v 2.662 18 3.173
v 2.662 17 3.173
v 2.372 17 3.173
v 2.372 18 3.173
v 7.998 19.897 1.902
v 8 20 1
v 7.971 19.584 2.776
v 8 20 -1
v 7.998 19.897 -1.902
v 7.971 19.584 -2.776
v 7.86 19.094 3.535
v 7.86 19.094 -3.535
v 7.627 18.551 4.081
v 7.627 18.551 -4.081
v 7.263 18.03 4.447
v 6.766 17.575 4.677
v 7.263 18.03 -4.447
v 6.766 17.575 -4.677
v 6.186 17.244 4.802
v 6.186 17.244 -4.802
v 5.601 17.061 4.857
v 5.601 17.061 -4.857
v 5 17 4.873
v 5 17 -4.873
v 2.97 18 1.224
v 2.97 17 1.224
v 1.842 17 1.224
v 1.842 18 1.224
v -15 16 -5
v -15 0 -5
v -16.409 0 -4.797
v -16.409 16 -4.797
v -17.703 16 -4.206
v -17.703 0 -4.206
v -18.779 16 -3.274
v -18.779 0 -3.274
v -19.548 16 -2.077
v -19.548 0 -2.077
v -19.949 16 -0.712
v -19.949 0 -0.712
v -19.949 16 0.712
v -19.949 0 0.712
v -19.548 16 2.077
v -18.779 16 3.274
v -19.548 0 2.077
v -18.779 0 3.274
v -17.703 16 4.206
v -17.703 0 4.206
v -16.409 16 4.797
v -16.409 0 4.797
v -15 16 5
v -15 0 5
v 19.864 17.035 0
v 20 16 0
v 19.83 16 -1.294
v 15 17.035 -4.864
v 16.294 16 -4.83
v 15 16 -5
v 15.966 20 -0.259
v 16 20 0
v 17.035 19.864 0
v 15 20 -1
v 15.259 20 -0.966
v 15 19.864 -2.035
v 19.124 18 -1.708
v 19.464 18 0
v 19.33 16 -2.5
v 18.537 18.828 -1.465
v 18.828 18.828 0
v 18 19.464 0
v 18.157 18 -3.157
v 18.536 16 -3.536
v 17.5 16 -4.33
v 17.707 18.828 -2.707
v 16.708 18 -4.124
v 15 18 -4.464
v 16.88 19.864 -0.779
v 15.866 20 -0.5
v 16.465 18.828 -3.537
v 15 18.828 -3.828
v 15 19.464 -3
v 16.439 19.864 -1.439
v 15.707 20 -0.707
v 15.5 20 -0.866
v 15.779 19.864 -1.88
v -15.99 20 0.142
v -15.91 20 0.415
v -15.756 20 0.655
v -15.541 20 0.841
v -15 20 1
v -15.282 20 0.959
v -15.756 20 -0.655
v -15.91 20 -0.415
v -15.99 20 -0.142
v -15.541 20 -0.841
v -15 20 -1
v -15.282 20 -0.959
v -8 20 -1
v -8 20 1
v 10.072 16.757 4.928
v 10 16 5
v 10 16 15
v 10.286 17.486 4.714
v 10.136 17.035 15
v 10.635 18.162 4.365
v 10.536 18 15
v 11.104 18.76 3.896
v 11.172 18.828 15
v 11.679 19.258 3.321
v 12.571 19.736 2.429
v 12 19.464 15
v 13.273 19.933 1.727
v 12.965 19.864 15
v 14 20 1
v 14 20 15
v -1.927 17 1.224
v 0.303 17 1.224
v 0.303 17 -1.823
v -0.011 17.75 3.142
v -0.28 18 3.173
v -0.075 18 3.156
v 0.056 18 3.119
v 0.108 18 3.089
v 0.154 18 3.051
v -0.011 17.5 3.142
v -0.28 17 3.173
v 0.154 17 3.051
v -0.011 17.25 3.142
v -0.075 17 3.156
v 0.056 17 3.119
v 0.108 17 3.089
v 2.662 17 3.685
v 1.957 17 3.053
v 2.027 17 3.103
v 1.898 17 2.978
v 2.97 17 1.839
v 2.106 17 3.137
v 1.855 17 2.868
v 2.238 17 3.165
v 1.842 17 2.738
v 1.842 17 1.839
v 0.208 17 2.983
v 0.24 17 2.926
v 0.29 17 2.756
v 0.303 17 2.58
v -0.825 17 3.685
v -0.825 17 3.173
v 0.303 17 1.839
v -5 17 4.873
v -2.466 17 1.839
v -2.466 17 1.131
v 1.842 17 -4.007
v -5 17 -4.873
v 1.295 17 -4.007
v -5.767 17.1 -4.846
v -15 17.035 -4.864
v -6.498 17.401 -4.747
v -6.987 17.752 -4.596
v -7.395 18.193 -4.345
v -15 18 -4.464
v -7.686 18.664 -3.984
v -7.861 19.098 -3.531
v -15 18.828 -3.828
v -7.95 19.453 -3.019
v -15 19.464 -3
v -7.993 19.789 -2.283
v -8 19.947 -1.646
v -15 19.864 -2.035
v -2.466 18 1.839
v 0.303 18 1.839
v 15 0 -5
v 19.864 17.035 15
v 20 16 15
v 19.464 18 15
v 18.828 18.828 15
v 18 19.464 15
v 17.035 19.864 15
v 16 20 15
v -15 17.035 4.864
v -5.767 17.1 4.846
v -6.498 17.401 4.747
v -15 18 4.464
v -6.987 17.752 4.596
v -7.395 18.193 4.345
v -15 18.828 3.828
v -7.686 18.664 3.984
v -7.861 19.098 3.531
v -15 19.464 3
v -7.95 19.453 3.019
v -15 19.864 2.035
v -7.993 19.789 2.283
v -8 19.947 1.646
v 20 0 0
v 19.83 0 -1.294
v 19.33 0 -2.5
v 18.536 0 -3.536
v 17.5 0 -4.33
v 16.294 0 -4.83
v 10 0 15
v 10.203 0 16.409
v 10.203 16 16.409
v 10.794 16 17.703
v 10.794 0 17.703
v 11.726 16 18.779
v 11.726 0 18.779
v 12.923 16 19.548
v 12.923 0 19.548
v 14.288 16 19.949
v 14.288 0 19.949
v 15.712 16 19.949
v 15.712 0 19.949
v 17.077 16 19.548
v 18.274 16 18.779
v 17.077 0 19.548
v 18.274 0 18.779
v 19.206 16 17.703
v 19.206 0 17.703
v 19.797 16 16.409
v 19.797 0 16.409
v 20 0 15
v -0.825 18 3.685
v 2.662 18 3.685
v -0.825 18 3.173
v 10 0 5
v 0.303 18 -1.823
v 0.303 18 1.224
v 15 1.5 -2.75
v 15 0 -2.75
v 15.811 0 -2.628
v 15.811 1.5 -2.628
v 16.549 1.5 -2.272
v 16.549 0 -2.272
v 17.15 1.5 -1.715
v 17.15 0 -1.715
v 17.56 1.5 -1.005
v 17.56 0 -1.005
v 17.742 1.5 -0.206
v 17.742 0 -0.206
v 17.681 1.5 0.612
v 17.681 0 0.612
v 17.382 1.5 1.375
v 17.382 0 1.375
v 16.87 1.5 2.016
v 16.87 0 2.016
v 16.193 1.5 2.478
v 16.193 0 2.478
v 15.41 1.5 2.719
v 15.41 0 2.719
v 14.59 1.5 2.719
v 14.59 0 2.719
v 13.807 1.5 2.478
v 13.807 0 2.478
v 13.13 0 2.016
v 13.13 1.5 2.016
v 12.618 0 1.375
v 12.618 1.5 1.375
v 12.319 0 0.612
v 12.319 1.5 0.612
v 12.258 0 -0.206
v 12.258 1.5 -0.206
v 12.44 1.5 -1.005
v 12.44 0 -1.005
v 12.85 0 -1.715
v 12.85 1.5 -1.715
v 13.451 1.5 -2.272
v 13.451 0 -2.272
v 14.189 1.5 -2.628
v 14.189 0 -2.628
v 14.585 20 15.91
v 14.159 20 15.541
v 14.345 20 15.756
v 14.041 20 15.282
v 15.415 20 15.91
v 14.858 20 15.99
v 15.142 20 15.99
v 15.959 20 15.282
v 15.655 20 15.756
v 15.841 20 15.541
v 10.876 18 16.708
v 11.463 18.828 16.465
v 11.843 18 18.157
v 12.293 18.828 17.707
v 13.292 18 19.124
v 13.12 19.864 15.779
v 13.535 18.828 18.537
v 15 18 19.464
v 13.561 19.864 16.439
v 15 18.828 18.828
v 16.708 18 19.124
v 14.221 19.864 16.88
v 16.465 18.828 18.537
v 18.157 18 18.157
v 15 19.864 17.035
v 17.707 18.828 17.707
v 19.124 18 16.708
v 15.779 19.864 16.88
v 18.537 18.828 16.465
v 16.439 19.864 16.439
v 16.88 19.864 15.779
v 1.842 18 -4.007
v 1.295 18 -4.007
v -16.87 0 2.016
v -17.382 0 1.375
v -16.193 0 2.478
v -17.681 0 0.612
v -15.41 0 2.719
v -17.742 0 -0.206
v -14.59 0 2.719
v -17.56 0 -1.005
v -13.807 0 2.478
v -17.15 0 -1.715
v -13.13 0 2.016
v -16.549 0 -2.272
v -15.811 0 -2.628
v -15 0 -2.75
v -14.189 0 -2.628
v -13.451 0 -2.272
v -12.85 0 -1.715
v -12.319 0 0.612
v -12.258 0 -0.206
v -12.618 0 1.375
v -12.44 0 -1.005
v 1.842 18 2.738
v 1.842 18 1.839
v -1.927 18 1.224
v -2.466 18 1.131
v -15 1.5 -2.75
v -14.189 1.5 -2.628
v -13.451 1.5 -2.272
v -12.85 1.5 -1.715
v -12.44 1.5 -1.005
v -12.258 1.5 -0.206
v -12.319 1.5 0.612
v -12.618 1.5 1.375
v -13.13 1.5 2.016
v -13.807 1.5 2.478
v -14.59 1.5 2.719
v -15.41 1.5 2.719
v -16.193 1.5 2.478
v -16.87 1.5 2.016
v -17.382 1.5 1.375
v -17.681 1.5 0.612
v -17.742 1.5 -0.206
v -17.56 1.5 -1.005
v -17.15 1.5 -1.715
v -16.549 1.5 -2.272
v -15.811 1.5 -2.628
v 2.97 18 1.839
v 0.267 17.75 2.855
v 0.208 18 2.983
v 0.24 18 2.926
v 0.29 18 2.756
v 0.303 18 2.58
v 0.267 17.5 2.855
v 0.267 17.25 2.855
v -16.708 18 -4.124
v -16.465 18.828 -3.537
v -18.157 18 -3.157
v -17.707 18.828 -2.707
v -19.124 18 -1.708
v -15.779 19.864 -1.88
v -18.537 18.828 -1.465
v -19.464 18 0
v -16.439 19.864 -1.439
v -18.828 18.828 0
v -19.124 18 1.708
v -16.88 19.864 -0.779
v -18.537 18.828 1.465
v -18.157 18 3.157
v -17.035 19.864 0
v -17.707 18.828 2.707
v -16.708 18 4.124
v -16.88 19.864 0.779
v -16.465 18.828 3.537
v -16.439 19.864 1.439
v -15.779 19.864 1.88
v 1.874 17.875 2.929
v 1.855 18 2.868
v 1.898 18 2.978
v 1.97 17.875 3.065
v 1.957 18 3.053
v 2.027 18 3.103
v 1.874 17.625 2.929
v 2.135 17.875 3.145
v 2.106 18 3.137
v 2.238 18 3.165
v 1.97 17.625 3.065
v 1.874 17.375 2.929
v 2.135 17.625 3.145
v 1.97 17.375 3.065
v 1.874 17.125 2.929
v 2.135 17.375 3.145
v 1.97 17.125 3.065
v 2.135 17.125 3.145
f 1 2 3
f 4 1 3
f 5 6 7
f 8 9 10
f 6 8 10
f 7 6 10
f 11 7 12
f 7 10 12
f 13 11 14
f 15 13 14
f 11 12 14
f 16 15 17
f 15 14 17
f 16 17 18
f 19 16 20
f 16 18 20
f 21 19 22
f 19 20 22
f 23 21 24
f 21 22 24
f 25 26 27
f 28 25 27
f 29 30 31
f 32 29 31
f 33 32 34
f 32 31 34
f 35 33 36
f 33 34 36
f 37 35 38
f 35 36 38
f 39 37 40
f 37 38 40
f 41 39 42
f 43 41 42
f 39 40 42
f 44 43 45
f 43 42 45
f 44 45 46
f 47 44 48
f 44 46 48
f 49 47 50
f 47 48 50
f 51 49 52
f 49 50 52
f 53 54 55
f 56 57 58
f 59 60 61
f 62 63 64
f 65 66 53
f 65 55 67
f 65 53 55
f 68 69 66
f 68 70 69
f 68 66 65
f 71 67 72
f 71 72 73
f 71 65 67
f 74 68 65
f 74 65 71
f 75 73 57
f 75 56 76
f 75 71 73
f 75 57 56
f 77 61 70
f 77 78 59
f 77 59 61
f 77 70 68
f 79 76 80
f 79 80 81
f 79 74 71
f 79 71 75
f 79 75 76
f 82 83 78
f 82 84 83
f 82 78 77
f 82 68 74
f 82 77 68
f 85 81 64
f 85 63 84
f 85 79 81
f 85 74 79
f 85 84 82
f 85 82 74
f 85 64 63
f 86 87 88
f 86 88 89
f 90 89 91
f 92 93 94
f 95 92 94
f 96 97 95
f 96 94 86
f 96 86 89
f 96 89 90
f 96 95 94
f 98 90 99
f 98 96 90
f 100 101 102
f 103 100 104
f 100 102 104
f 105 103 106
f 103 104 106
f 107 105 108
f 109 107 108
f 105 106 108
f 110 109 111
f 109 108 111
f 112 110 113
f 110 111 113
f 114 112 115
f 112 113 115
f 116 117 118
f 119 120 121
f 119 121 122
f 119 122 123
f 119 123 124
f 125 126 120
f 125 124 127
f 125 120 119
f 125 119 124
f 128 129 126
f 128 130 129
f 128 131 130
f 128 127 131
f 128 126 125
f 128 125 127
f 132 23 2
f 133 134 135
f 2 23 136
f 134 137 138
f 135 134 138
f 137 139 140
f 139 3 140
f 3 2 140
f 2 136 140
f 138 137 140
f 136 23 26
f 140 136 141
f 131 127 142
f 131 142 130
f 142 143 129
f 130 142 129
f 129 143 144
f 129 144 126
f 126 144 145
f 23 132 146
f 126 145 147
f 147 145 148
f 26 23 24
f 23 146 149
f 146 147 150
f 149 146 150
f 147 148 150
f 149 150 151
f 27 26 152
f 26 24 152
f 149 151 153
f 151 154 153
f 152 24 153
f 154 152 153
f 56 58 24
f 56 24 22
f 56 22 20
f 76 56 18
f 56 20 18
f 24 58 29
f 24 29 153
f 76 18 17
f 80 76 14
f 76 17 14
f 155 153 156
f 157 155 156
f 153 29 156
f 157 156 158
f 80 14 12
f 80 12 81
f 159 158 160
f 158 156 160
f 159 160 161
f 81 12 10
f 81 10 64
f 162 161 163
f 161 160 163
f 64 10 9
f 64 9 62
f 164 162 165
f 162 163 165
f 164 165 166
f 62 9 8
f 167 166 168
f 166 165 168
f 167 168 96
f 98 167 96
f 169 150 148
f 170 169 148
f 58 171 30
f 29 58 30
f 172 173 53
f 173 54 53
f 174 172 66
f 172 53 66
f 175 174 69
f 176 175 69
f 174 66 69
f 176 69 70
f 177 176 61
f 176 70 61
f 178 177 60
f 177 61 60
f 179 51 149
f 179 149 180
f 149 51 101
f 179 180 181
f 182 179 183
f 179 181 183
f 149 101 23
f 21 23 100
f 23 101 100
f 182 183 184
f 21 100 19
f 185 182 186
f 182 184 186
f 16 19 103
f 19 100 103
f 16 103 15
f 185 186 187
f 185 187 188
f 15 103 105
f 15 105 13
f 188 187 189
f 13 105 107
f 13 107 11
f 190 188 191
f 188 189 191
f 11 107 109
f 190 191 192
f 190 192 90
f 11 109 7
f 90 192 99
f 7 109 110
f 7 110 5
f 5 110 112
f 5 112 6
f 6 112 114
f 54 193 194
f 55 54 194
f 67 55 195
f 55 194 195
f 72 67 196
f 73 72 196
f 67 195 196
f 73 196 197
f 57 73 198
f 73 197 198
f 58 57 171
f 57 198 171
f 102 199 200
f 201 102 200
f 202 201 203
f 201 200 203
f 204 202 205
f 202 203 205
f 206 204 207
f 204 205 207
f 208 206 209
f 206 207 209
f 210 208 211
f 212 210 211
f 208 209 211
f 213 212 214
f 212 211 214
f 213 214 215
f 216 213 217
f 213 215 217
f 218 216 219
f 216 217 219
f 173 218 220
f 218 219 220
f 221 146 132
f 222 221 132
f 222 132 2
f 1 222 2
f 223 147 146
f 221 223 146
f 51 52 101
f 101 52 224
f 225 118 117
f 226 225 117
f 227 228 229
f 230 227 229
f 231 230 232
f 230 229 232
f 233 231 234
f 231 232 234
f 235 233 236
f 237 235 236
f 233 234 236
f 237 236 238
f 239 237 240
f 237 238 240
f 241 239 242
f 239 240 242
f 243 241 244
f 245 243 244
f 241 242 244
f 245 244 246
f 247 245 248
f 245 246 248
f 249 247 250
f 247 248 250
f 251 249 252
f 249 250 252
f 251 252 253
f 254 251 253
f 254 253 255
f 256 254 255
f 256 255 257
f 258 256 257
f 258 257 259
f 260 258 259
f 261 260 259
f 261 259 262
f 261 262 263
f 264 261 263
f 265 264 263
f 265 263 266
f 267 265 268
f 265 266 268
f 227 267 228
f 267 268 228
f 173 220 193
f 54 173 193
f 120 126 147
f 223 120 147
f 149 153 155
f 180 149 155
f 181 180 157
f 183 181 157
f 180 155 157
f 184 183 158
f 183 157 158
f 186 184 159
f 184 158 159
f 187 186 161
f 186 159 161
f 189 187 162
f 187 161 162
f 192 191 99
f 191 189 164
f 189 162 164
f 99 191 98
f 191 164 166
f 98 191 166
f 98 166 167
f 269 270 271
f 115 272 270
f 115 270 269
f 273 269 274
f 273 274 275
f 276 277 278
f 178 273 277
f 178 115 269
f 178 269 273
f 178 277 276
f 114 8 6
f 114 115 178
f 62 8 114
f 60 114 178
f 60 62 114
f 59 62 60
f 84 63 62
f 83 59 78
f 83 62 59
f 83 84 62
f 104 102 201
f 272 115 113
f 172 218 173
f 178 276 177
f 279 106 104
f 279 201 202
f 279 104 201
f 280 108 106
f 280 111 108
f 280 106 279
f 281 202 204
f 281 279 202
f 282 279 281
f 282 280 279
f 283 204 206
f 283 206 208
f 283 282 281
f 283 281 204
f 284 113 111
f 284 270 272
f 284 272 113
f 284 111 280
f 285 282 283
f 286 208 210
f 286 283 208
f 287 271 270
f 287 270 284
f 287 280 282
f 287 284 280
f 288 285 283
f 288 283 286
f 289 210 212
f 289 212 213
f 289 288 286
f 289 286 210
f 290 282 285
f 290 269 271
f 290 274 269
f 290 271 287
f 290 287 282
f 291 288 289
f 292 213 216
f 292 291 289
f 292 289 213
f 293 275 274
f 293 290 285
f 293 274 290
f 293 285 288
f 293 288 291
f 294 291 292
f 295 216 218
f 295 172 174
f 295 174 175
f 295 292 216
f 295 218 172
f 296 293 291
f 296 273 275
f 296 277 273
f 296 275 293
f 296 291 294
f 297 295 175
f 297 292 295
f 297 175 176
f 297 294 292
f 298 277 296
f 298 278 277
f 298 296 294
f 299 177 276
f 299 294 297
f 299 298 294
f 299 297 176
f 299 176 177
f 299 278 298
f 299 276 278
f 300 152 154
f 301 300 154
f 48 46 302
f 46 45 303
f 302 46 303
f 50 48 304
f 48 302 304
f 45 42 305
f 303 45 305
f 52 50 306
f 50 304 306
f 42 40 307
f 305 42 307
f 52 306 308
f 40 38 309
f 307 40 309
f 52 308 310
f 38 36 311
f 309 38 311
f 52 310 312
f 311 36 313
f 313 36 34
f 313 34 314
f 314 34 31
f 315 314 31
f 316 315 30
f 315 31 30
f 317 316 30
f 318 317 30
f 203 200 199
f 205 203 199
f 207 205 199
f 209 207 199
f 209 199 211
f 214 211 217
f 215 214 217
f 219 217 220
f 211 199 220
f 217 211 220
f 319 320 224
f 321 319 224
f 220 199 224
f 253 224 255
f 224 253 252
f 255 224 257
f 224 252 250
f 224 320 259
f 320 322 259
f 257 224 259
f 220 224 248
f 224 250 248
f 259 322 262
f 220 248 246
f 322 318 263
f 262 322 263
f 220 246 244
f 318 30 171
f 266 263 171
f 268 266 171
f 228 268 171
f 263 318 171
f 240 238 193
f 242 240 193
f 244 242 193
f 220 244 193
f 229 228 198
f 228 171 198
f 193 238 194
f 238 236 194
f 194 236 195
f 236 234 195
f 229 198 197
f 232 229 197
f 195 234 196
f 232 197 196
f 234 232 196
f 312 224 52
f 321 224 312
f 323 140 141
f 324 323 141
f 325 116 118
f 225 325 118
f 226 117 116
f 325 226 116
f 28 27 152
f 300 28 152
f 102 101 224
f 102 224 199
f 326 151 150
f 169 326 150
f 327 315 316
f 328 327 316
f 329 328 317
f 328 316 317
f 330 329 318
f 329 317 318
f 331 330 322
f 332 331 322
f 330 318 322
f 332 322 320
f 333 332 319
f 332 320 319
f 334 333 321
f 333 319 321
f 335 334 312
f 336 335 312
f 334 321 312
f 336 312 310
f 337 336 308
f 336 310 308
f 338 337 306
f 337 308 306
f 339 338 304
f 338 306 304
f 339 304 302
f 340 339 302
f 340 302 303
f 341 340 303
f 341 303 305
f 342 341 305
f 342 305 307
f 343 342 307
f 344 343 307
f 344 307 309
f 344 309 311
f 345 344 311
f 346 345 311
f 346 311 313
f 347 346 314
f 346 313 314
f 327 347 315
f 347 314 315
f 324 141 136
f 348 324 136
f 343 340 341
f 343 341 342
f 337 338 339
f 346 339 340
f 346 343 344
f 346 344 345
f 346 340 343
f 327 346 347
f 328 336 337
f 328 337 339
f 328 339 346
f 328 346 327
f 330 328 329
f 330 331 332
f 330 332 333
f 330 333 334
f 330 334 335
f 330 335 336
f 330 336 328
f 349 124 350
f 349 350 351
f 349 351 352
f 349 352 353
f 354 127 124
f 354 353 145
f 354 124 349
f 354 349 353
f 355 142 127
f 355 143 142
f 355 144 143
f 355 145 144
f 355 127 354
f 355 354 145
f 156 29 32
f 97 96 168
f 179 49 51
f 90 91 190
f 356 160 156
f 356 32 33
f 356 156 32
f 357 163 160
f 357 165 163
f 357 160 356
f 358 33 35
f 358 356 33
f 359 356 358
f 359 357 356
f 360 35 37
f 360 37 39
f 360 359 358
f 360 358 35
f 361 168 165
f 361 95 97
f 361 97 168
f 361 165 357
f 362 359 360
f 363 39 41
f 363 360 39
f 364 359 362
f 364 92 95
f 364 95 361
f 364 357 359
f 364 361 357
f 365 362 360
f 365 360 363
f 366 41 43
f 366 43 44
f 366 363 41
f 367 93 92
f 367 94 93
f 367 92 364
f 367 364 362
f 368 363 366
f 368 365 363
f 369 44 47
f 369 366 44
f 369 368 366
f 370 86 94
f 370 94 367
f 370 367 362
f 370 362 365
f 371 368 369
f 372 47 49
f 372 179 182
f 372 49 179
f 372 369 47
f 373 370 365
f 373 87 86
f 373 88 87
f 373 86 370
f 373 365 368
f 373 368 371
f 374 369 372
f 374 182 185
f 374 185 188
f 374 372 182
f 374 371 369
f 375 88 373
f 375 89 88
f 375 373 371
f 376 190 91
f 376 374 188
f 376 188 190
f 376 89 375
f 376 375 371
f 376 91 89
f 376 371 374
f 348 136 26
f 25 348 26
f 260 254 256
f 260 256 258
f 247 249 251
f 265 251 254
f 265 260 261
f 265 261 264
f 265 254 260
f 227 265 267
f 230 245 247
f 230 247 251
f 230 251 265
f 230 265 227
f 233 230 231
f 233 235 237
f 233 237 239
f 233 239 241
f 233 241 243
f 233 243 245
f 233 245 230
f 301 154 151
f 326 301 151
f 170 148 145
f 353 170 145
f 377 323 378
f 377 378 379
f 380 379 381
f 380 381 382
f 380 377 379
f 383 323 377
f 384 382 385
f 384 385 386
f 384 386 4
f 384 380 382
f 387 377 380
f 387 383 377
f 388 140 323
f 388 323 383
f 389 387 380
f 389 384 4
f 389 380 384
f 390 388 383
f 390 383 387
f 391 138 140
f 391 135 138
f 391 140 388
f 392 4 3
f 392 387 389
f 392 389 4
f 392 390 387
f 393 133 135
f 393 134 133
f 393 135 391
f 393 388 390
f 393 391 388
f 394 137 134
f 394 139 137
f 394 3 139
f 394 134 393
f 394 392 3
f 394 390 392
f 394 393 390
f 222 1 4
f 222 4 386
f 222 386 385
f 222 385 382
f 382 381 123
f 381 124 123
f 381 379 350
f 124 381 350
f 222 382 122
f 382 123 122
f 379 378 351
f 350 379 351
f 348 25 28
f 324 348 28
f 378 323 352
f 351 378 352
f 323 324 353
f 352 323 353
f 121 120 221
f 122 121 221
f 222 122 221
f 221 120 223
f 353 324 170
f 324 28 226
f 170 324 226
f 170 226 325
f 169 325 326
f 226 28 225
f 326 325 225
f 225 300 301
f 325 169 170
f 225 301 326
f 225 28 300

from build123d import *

# Parameters (mm, degrees)
BOSS_EXTRUDE1_DEPTH     = 20
FILLET1_R               = 4
SKETCH2_R               = 2.75
CUT_EXTRUDE1_DEPTH      = 1.5
LPATTERN1_COUNT         = 2
LPATTERN1_PITCH         = 30
CUT_EXTRUDE2_DEPTH      = 35.641016151
CUT_EXTRUDE2_DEPTH_BACK = 35.641016151
WRAP1_DEPTH             = 1


# Read off the part's stored shape, not the designer's step: Wrap1
with BuildPart() as part:
    # Sketch1 → Boss-Extrude1 (new body)
    with BuildSketch(Plane(origin=(0, 0, 0), x_dir=(1, 0, 0), z_dir=(0, 1, 0))):
        with BuildLine():
            Line((-15, -5), (10, -5))
            Line((10, -5), (10, -15))
            ThreePointArc((10, -15), (15, -20), (20, -15))
            Line((20, -15), (20, 0))
            ThreePointArc((20, 0), (18.535533906, 3.535533906), (15, 5))
            Line((15, 5), (-15, 5))
            ThreePointArc((-15, 5), (-20, 0), (-15, -5))
        make_face()
    extrude(amount=BOSS_EXTRUDE1_DEPTH)

    # Fillet1
    fillet1_edges = [part.edges().sort_by_distance(p)[0] for p in [
        (15, 20, 20),
        (20, 20, 7.5),
        (18.535533906, 20, -3.535533906),
        (0, 20, -5),
        (-20, 20, 0),
        (-2.5, 20, 5),
        (10, 20, 10),
    ]]
    fillet(fillet1_edges, radius=FILLET1_R)

    # Sketch2 → Cut-Extrude1 (cut)
    with BuildSketch(Plane.XZ):
        with Locations(Location((-15, 0, 0), (0, 0, 270))):
            Circle(SKETCH2_R)
    cut_extrude1 = extrude(amount=-CUT_EXTRUDE1_DEPTH, mode=Mode.SUBTRACT)

    # LPattern1: Cut-Extrude1 ×2
    with Locations(*[(i * LPATTERN1_PITCH, 0, 0) for i in range(1, LPATTERN1_COUNT)]):
        add(cut_extrude1, mode=Mode.SUBTRACT)

    # Sketch3 → Cut-Extrude2 (cut, two sides: drawn at the far end of the back side and taken through both)
    with BuildSketch(Plane.XY.offset(-CUT_EXTRUDE2_DEPTH_BACK)):
        with BuildLine():
            Line((5, 17), (-5, 17))
            ThreePointArc((-5, 17), (-8, 20), (-5, 23))
            Line((-5, 23), (5, 23))
            ThreePointArc((5, 23), (8, 20), (5, 17))
        make_face()
    extrude(amount=CUT_EXTRUDE2_DEPTH + CUT_EXTRUDE2_DEPTH_BACK, mode=Mode.SUBTRACT)

    # Wrap1 outline → Wrap1 (add)
    with BuildSketch(Plane(origin=(0, 17, 0), x_dir=(1, 0, 0), z_dir=(0, 1, 0))):
        with BuildLine():
            add(Edge.make_bspline(
                [(1.841863893, -2.738252863), (1.843167117, -2.772610038), (1.845627679, -2.837478309), (1.870220056, -2.928234816), (1.910417773, -3.005660397), (1.968656697, -3.069246584), (2.04558102, -3.11604167), (2.138808991, -3.149069173), (2.249599225, -3.170094309), (2.329470455, -3.171691186), (2.372312611, -3.172547735)],
                knots=[0, 0, 0, 0, 0.130861591, 0.247074017, 0.355594274, 0.460908048, 0.571758266, 0.695587752, 0.836716212, 1, 1, 1, 1], degree=3))
            Line((1.841863893, -2.738252863), (1.841863893, -1.839214402))
            Line((1.841863893, -1.839214402), (2.970069021, -1.839214402))
            Line((2.970069021, -1.839214402), (2.970069021, -1.223829786))
            Line((2.970069021, -1.223829786), (1.841863893, -1.223829786))
            Line((1.841863893, -1.223829786), (1.841863893, 4.006939444))
            Line((1.841863893, 4.006939444), (1.295389534, 4.006939444))
            Line((1.295389534, 4.006939444), (-2.465828415, -1.130881068))
            Line((-2.465828415, -1.130881068), (-2.465828415, -1.839214402))
            Line((-2.465828415, -1.839214402), (0.303402354, -1.839214402))
            Line((0.303402354, -1.839214402), (0.303402354, -2.579599017))
            add(Edge.make_bspline(
                [(0.154363893, -3.050752863), (0.177887379, -3.022926473), (0.227059219, -2.964760144), (0.27088721, -2.852439848), (0.29873926, -2.722573798), (0.301775942, -2.629466316), (0.303402354, -2.579599017)],
                knots=[0, 0, 0, 0, 0.214745145, 0.448888149, 0.704830817, 1, 1, 1, 1], degree=3))
            add(Edge.make_bspline(
                [(-0.279930979, -3.172547735), (-0.230645452, -3.171172689), (-0.140021776, -3.168644324), (-0.016795191, -3.146993527), (0.083806957, -3.111501143), (0.132261074, -3.069783001), (0.154363893, -3.050752863)],
                knots=[0, 0, 0, 0, 0.31964973, 0.587755386, 0.811950592, 1, 1, 1, 1], degree=3))
            Line((-0.279930979, -3.172547735), (-0.824802774, -3.172547735))
            Line((-0.824802774, -3.172547735), (-0.824802774, -3.685368248))
            Line((-0.824802774, -3.685368248), (2.662376713, -3.685368248))
            Line((2.662376713, -3.685368248), (2.662376713, -3.172547735))
            Line((2.662376713, -3.172547735), (2.372312611, -3.172547735))
        make_face()
        Polygon((0.303402354, 1.822644573), (0.303402354, -1.223829786), (-1.927366876, -1.223829786), align=None, mode=Mode.SUBTRACT)
    extrude(amount=WRAP1_DEPTH)


solid = part.part
